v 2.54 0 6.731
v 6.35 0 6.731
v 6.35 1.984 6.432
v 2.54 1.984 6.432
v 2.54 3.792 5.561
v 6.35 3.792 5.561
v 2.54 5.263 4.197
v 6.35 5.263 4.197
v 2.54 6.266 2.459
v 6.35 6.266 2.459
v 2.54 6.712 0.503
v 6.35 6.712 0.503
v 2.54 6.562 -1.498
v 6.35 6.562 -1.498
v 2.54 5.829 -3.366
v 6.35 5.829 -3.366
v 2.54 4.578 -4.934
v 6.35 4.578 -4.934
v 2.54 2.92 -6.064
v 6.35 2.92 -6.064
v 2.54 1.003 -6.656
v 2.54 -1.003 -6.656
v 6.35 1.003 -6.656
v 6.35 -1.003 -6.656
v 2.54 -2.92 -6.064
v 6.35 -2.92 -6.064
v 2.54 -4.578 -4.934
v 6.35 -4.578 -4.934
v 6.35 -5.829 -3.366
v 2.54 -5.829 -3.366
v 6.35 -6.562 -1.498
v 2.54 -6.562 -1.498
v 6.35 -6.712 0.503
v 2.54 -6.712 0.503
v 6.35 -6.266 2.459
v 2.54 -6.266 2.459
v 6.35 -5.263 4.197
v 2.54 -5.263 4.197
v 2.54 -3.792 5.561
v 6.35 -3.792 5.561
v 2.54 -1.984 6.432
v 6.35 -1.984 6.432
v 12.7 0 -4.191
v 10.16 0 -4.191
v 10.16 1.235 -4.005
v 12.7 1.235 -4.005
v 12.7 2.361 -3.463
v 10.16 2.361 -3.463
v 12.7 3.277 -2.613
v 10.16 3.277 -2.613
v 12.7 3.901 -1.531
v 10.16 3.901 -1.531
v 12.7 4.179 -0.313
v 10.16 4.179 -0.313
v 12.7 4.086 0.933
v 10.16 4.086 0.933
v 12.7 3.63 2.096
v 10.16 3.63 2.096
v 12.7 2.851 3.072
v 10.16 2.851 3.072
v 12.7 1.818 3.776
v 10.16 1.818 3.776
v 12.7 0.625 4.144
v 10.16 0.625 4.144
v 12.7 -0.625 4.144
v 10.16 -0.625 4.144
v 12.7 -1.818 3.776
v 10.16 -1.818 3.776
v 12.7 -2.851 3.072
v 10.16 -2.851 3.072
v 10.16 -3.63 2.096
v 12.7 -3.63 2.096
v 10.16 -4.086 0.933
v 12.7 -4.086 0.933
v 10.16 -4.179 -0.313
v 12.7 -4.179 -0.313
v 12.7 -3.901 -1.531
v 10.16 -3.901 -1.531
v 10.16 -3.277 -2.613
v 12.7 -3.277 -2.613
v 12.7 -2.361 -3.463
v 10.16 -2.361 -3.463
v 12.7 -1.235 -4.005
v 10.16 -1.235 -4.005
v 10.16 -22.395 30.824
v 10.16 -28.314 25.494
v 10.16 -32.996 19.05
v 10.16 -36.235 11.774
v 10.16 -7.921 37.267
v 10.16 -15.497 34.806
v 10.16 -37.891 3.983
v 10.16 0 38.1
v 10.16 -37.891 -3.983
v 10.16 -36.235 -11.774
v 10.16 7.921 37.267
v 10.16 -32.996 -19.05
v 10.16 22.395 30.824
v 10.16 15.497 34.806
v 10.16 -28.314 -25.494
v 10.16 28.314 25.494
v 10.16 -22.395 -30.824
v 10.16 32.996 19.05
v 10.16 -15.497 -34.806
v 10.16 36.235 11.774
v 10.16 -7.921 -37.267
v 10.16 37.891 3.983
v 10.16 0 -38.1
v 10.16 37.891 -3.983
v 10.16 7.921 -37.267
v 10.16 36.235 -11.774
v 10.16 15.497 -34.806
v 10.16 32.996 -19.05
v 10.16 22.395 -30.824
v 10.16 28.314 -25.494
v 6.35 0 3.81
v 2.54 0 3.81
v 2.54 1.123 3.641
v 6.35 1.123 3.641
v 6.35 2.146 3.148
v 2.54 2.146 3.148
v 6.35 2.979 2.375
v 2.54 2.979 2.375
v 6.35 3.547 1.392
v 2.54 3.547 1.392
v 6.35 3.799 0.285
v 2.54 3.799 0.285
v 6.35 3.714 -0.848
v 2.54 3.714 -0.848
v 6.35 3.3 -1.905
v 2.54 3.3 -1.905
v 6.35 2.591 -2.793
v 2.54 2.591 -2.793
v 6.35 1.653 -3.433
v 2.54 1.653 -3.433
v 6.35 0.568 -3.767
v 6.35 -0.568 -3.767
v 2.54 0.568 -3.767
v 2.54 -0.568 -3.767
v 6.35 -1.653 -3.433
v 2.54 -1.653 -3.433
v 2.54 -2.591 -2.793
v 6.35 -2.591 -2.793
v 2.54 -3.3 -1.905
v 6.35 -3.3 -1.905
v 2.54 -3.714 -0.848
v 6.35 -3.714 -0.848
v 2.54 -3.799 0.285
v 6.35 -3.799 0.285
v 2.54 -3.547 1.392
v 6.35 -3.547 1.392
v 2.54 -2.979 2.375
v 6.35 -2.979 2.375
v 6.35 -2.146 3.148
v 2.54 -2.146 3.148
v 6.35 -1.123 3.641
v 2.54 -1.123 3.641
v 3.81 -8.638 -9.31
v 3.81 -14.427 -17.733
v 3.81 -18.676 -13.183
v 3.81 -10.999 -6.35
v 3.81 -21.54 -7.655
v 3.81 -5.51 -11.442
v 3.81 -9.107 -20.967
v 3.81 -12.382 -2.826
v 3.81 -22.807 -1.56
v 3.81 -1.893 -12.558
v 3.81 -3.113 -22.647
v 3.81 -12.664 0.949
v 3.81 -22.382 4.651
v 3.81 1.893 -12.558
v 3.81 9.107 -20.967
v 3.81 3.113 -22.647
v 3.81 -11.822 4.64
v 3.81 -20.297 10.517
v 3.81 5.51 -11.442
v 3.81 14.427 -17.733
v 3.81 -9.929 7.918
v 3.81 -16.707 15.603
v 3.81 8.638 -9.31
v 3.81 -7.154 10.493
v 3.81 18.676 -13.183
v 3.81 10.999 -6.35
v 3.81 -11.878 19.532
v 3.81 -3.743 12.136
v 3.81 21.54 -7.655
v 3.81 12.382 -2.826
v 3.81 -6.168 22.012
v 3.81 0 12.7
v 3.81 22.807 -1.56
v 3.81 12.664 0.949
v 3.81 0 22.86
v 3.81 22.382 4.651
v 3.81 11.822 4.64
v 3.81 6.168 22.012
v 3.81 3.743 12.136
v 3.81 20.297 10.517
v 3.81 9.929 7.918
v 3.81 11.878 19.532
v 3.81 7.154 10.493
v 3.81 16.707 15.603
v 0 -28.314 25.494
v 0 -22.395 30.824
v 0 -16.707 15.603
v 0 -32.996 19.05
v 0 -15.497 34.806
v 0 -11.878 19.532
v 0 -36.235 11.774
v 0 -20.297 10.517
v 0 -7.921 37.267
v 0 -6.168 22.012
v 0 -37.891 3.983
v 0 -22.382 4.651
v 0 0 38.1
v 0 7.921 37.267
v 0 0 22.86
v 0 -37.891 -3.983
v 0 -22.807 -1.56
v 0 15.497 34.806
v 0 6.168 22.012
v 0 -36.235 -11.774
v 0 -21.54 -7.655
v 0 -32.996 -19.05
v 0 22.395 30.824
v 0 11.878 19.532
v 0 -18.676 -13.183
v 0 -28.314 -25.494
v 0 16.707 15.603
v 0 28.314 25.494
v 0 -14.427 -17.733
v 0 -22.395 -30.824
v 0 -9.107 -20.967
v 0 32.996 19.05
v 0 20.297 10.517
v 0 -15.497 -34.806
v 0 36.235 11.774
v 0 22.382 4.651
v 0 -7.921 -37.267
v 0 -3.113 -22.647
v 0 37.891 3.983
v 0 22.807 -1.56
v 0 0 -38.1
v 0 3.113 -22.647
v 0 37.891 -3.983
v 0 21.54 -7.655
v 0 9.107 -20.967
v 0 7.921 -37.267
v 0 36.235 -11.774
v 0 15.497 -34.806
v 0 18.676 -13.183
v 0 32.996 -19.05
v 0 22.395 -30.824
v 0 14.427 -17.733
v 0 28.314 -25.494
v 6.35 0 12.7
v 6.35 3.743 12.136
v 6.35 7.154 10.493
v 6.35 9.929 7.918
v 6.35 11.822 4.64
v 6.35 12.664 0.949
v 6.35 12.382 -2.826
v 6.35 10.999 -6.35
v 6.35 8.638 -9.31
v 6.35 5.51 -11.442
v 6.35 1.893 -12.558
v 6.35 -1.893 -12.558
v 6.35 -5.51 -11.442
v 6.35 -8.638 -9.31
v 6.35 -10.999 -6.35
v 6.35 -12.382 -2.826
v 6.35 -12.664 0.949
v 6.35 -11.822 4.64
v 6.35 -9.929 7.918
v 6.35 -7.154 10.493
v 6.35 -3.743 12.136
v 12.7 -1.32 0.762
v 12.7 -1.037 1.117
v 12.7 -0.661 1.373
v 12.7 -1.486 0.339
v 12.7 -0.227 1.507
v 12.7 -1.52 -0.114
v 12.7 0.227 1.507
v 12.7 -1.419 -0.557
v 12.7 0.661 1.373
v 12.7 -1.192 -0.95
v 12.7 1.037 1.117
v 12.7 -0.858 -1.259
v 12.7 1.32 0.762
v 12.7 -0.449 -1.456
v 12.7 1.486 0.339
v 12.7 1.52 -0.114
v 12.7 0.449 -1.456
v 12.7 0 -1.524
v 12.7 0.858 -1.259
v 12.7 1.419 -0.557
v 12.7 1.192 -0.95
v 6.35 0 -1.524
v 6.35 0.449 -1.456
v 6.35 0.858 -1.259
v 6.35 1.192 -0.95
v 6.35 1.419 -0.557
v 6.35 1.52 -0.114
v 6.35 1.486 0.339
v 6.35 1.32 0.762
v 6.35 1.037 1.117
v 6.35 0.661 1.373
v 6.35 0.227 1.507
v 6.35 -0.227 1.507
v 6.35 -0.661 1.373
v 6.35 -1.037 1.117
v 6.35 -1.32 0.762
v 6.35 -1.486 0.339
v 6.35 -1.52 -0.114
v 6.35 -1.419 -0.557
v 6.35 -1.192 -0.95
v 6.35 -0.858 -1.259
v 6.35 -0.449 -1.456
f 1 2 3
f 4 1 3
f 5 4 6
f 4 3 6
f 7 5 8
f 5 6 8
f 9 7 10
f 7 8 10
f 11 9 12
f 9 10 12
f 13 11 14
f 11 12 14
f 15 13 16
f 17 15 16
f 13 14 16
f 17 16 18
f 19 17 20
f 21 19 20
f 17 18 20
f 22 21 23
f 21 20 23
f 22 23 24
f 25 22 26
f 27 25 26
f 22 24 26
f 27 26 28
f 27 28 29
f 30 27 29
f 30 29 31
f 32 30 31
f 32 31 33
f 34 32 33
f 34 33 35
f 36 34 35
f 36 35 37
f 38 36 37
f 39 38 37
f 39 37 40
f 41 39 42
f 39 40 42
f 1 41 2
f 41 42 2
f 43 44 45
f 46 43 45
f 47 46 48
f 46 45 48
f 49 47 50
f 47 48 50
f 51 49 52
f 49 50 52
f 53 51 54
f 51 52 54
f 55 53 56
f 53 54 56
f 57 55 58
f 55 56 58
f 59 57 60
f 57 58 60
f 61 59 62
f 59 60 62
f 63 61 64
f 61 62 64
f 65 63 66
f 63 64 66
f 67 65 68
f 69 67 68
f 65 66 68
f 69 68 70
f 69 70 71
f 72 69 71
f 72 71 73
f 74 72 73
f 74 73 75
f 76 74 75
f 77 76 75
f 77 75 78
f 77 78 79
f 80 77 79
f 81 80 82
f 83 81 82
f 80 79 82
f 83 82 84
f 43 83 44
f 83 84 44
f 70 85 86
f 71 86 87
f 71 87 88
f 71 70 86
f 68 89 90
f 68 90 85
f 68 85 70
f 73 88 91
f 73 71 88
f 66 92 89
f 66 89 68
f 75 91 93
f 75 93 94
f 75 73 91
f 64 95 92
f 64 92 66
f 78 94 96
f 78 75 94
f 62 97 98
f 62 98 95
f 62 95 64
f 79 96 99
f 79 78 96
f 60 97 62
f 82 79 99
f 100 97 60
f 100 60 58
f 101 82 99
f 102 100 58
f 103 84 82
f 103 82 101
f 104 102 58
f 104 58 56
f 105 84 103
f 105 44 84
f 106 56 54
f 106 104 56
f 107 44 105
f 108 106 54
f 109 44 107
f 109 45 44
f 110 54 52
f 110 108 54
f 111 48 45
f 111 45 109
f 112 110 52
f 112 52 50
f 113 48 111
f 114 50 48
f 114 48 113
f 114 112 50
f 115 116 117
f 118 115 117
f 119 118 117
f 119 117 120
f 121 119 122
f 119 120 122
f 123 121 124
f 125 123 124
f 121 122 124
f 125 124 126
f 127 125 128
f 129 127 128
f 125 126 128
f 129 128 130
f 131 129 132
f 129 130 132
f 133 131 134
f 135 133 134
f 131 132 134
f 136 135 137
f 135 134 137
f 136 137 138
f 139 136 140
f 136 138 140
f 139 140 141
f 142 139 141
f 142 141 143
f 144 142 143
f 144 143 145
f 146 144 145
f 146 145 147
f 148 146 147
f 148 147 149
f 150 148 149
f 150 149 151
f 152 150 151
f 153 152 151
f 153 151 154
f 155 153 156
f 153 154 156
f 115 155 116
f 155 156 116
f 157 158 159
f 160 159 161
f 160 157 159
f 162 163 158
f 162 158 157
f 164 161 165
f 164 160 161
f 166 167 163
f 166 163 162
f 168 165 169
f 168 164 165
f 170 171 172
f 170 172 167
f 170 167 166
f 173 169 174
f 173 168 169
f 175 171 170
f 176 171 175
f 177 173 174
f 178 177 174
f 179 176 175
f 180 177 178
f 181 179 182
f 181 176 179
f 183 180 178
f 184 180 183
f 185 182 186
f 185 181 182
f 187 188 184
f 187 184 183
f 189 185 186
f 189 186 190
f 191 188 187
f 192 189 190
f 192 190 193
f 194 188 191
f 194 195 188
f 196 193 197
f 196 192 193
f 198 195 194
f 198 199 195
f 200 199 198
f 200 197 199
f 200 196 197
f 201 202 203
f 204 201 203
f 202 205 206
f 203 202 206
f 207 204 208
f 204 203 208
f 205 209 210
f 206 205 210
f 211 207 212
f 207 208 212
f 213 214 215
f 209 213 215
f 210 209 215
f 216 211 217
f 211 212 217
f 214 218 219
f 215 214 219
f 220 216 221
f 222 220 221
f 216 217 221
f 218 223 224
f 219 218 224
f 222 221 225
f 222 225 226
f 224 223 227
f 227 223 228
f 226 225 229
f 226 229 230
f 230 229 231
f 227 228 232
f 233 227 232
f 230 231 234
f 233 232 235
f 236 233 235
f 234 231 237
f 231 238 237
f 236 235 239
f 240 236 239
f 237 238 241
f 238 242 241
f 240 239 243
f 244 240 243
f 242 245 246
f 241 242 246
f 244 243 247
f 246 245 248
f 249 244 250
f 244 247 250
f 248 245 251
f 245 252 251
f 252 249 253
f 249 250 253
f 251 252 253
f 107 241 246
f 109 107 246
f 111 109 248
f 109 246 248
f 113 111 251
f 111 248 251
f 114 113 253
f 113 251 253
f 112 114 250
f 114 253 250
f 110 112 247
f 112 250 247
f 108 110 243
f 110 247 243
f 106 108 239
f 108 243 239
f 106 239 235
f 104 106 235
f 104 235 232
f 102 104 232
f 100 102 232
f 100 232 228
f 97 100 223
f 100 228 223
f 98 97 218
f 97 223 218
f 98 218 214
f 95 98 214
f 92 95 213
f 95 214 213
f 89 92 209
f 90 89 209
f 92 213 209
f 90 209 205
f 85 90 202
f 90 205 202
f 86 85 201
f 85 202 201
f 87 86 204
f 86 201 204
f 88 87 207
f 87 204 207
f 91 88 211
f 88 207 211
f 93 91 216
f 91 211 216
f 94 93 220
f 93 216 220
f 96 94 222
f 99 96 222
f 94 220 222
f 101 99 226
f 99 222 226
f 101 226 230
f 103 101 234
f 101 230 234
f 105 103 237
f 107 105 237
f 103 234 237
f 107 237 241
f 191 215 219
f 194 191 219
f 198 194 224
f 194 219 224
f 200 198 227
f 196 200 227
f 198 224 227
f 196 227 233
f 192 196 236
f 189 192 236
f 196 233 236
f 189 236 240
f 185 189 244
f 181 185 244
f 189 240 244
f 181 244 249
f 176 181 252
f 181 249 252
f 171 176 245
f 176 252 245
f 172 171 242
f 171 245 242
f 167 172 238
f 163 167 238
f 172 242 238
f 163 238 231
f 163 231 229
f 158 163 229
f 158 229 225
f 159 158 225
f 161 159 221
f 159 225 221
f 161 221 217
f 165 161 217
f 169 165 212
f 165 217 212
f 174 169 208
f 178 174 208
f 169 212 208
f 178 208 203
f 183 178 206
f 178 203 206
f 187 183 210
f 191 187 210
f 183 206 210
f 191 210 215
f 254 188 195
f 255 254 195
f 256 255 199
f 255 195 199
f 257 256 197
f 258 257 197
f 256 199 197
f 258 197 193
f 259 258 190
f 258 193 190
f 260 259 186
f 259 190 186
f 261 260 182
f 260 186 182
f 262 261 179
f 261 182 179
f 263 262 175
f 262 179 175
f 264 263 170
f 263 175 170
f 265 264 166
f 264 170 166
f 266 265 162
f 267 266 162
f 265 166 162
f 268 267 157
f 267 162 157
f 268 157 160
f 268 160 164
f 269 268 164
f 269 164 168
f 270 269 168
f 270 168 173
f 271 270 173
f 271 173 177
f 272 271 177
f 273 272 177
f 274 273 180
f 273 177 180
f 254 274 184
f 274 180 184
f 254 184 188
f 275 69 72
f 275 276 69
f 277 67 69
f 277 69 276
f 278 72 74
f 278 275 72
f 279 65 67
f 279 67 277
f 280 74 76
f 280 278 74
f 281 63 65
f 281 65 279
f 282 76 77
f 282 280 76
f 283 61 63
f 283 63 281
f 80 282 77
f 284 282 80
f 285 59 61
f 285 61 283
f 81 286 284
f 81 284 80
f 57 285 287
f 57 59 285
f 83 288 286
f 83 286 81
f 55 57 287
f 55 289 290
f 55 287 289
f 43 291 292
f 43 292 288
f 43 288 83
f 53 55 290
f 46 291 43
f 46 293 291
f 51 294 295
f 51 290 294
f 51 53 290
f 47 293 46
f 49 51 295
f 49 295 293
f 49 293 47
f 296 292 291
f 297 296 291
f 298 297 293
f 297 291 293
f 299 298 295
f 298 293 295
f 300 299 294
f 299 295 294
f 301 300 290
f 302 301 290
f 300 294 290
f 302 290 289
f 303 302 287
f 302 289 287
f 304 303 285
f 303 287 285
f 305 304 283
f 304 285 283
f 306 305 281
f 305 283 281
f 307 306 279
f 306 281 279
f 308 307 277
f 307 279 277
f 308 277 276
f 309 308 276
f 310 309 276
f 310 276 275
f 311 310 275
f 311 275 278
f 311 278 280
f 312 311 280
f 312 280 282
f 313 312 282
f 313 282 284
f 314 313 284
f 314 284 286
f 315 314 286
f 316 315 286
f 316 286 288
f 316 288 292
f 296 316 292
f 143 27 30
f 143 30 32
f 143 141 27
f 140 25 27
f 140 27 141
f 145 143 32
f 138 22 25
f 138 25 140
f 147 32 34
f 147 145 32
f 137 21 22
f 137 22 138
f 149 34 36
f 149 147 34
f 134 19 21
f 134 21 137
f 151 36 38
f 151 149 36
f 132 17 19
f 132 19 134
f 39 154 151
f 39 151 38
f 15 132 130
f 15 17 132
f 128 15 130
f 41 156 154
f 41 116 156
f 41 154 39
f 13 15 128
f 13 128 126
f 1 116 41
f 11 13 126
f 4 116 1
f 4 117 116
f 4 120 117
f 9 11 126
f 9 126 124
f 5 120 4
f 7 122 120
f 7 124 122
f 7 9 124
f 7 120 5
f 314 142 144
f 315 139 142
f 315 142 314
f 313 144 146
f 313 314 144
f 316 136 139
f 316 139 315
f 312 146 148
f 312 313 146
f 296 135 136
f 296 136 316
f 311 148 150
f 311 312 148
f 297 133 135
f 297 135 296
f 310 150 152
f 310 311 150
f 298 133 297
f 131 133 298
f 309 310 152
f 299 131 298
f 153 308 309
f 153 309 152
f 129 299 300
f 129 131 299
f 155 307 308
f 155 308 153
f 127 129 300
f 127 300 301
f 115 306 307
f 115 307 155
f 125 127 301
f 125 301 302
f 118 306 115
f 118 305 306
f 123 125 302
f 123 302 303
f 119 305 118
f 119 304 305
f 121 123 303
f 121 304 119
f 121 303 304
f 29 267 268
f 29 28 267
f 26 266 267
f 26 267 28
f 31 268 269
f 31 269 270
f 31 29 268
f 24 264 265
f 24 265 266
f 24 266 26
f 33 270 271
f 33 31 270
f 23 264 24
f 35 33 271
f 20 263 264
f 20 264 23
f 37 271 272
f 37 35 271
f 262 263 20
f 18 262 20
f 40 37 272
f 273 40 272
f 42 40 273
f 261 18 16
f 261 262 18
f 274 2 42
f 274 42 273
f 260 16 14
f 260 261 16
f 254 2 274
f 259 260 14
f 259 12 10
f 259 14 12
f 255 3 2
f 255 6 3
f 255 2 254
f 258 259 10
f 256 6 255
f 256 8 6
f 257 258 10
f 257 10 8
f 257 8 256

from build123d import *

# Parameters (mm, degrees)
SKETCH1_R           = 38.1
BOSS_EXTRUDE1_DEPTH = 10.16
SKETCH3_R           = 4.191
BOSS_EXTRUDE2_DEPTH = 2.54
SKETCH4_R           = 1.524
CUT_EXTRUDE1_DEPTH  = 13.7
SKETCH5_R           = 22.86
CUT_EXTRUDE2_DEPTH  = 3.81
SKETCH6_R           = 12.7
CUT_EXTRUDE3_DEPTH  = 2.54
SKETCH7_R           = 6.731
BOSS_EXTRUDE3_DEPTH = 3.81
SKETCH9_R           = 3.81
CUT_EXTRUDE4_DEPTH  = 3.81


with BuildPart() as part:
    # Sketch1 → Boss-Extrude1 (new body)
    with BuildSketch(Plane(origin=(0, 0, 0), x_dir=(0, 0, -1), z_dir=(1, 0, 0))):
        Circle(SKETCH1_R)
    extrude(amount=BOSS_EXTRUDE1_DEPTH)

    # Sketch3 → Boss-Extrude2 (add)
    with BuildSketch(Plane(origin=(10.16, 0, 0), x_dir=(0, 0, -1), z_dir=(1, 0, 0))):
        Circle(SKETCH3_R)
    extrude(amount=BOSS_EXTRUDE2_DEPTH)

    # Sketch4 → Cut-Extrude1 (cut, through all)
    with BuildSketch(Plane(origin=(12.7, 0, 0), x_dir=(0, 0, -1), z_dir=(1, 0, 0))):
        Circle(SKETCH4_R)
    extrude(amount=-CUT_EXTRUDE1_DEPTH, mode=Mode.SUBTRACT)

    # Sketch5 → Cut-Extrude2 (cut)
    with BuildSketch(Plane.ZY):
        Circle(SKETCH5_R)
    extrude(amount=-CUT_EXTRUDE2_DEPTH, mode=Mode.SUBTRACT)

    # Sketch6 → Cut-Extrude3 (cut)
    with BuildSketch(Plane.ZY.offset(-3.81)):
        Circle(SKETCH6_R)
    extrude(amount=-CUT_EXTRUDE3_DEPTH, mode=Mode.SUBTRACT)

    # Sketch7 → Boss-Extrude3 (add)
    with BuildSketch(Plane.ZY.offset(-6.35)):
        Circle(SKETCH7_R)
    extrude(amount=BOSS_EXTRUDE3_DEPTH)

    # Sketch9 → Cut-Extrude4 (cut)
    with BuildSketch(Plane.ZY.offset(-2.54)):
        Circle(SKETCH9_R)
    extrude(amount=-CUT_EXTRUDE4_DEPTH, mode=Mode.SUBTRACT)


solid = part.part
